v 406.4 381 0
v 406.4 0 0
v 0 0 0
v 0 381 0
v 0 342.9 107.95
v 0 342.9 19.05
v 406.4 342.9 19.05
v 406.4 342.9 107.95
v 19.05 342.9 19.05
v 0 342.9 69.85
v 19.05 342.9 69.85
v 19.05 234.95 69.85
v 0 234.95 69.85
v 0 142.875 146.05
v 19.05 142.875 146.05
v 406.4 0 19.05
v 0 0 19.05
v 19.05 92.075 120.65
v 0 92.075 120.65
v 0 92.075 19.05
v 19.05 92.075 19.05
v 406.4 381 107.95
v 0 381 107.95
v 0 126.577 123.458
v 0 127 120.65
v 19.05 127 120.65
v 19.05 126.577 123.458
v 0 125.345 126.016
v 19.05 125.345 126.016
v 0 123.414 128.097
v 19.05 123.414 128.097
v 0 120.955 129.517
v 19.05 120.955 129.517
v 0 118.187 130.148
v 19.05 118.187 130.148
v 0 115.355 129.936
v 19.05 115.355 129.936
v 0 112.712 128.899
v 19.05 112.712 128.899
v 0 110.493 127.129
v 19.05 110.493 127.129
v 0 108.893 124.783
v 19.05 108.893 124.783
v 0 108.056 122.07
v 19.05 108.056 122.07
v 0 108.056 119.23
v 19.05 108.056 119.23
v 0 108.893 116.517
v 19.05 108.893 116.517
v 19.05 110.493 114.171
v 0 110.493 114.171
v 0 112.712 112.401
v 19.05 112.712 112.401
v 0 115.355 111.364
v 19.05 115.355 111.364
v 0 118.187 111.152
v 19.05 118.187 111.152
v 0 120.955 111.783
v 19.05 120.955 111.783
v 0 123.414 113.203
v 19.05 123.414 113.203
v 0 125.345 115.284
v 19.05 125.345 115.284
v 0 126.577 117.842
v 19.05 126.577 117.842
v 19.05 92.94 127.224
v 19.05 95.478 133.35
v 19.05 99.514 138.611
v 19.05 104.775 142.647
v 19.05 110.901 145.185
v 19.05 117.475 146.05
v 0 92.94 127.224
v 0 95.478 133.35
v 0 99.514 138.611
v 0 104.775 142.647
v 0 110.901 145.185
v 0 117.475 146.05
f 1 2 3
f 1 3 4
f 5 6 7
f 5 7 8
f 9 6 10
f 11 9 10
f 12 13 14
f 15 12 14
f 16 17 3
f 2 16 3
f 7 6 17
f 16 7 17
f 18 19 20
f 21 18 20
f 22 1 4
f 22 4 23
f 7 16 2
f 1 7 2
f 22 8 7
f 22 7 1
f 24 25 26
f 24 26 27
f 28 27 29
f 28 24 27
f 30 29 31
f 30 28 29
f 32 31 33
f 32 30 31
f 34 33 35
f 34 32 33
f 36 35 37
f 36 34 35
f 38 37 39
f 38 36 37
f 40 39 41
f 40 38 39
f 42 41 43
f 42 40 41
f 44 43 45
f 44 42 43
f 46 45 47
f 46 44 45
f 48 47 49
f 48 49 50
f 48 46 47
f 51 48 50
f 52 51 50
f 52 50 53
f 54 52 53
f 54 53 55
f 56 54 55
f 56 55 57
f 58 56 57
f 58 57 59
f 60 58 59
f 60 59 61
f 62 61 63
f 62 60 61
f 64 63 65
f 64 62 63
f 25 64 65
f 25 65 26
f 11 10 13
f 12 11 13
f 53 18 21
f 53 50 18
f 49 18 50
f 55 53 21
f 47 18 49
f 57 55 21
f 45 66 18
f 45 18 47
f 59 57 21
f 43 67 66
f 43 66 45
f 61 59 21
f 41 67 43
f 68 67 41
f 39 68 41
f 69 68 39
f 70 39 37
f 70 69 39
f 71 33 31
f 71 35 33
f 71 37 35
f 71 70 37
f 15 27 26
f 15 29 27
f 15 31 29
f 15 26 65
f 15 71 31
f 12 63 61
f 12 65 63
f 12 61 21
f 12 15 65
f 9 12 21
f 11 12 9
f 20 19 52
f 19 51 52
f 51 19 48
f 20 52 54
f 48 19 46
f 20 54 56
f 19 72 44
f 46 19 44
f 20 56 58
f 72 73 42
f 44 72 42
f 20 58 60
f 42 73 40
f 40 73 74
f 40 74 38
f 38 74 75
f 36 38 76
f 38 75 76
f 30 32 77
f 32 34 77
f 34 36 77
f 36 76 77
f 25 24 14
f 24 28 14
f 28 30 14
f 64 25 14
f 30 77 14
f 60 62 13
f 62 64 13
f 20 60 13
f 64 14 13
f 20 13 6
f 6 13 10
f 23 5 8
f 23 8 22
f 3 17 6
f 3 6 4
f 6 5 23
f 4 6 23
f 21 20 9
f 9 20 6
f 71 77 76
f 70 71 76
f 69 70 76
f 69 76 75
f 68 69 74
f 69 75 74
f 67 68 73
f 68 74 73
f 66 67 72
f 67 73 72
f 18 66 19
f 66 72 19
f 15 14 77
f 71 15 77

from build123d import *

# Parameters (mm, degrees)
F1_W     = 38.1
F1_H     = 88.9
F2_DEPTH = 406.4
F3_R     = 9.525
F4_DEPTH = 19.05


with BuildPart() as f2:
    # F1 (on Right) → F2 (new body)
    with BuildSketch(Plane.YZ):
        Polygon((342.9, 19.05), (0, 19.05), (0, 0), (381, 0), (381, 19.05), align=None)
        with Locations((361.95, 63.5)):
            Rectangle(F1_W, F1_H)
    extrude(amount=F2_DEPTH)


with BuildPart() as f4:
    # F3 (on Right) → F4 (new body)
    with BuildSketch(Plane.YZ):
        with BuildLine():
            ThreePointArc((117.475, 146.05), (99.514488, 138.610512), (92.075, 120.65))
            Line((92.075, 120.65), (92.075, 19.05))
            Line((92.075, 19.05), (342.9, 19.05))
            Line((342.9, 19.05), (342.9, 69.85))
            Line((342.9, 69.85), (234.95, 69.85))
            Line((234.95, 69.85), (142.875, 146.05))
            Line((142.875, 146.05), (117.475, 146.05))
        make_face()
        with Locations((117.475, 120.65)):
            Circle(F3_R, mode=Mode.SUBTRACT)
    extrude(amount=F4_DEPTH)


solid = Compound([f2.part, f4.part])
